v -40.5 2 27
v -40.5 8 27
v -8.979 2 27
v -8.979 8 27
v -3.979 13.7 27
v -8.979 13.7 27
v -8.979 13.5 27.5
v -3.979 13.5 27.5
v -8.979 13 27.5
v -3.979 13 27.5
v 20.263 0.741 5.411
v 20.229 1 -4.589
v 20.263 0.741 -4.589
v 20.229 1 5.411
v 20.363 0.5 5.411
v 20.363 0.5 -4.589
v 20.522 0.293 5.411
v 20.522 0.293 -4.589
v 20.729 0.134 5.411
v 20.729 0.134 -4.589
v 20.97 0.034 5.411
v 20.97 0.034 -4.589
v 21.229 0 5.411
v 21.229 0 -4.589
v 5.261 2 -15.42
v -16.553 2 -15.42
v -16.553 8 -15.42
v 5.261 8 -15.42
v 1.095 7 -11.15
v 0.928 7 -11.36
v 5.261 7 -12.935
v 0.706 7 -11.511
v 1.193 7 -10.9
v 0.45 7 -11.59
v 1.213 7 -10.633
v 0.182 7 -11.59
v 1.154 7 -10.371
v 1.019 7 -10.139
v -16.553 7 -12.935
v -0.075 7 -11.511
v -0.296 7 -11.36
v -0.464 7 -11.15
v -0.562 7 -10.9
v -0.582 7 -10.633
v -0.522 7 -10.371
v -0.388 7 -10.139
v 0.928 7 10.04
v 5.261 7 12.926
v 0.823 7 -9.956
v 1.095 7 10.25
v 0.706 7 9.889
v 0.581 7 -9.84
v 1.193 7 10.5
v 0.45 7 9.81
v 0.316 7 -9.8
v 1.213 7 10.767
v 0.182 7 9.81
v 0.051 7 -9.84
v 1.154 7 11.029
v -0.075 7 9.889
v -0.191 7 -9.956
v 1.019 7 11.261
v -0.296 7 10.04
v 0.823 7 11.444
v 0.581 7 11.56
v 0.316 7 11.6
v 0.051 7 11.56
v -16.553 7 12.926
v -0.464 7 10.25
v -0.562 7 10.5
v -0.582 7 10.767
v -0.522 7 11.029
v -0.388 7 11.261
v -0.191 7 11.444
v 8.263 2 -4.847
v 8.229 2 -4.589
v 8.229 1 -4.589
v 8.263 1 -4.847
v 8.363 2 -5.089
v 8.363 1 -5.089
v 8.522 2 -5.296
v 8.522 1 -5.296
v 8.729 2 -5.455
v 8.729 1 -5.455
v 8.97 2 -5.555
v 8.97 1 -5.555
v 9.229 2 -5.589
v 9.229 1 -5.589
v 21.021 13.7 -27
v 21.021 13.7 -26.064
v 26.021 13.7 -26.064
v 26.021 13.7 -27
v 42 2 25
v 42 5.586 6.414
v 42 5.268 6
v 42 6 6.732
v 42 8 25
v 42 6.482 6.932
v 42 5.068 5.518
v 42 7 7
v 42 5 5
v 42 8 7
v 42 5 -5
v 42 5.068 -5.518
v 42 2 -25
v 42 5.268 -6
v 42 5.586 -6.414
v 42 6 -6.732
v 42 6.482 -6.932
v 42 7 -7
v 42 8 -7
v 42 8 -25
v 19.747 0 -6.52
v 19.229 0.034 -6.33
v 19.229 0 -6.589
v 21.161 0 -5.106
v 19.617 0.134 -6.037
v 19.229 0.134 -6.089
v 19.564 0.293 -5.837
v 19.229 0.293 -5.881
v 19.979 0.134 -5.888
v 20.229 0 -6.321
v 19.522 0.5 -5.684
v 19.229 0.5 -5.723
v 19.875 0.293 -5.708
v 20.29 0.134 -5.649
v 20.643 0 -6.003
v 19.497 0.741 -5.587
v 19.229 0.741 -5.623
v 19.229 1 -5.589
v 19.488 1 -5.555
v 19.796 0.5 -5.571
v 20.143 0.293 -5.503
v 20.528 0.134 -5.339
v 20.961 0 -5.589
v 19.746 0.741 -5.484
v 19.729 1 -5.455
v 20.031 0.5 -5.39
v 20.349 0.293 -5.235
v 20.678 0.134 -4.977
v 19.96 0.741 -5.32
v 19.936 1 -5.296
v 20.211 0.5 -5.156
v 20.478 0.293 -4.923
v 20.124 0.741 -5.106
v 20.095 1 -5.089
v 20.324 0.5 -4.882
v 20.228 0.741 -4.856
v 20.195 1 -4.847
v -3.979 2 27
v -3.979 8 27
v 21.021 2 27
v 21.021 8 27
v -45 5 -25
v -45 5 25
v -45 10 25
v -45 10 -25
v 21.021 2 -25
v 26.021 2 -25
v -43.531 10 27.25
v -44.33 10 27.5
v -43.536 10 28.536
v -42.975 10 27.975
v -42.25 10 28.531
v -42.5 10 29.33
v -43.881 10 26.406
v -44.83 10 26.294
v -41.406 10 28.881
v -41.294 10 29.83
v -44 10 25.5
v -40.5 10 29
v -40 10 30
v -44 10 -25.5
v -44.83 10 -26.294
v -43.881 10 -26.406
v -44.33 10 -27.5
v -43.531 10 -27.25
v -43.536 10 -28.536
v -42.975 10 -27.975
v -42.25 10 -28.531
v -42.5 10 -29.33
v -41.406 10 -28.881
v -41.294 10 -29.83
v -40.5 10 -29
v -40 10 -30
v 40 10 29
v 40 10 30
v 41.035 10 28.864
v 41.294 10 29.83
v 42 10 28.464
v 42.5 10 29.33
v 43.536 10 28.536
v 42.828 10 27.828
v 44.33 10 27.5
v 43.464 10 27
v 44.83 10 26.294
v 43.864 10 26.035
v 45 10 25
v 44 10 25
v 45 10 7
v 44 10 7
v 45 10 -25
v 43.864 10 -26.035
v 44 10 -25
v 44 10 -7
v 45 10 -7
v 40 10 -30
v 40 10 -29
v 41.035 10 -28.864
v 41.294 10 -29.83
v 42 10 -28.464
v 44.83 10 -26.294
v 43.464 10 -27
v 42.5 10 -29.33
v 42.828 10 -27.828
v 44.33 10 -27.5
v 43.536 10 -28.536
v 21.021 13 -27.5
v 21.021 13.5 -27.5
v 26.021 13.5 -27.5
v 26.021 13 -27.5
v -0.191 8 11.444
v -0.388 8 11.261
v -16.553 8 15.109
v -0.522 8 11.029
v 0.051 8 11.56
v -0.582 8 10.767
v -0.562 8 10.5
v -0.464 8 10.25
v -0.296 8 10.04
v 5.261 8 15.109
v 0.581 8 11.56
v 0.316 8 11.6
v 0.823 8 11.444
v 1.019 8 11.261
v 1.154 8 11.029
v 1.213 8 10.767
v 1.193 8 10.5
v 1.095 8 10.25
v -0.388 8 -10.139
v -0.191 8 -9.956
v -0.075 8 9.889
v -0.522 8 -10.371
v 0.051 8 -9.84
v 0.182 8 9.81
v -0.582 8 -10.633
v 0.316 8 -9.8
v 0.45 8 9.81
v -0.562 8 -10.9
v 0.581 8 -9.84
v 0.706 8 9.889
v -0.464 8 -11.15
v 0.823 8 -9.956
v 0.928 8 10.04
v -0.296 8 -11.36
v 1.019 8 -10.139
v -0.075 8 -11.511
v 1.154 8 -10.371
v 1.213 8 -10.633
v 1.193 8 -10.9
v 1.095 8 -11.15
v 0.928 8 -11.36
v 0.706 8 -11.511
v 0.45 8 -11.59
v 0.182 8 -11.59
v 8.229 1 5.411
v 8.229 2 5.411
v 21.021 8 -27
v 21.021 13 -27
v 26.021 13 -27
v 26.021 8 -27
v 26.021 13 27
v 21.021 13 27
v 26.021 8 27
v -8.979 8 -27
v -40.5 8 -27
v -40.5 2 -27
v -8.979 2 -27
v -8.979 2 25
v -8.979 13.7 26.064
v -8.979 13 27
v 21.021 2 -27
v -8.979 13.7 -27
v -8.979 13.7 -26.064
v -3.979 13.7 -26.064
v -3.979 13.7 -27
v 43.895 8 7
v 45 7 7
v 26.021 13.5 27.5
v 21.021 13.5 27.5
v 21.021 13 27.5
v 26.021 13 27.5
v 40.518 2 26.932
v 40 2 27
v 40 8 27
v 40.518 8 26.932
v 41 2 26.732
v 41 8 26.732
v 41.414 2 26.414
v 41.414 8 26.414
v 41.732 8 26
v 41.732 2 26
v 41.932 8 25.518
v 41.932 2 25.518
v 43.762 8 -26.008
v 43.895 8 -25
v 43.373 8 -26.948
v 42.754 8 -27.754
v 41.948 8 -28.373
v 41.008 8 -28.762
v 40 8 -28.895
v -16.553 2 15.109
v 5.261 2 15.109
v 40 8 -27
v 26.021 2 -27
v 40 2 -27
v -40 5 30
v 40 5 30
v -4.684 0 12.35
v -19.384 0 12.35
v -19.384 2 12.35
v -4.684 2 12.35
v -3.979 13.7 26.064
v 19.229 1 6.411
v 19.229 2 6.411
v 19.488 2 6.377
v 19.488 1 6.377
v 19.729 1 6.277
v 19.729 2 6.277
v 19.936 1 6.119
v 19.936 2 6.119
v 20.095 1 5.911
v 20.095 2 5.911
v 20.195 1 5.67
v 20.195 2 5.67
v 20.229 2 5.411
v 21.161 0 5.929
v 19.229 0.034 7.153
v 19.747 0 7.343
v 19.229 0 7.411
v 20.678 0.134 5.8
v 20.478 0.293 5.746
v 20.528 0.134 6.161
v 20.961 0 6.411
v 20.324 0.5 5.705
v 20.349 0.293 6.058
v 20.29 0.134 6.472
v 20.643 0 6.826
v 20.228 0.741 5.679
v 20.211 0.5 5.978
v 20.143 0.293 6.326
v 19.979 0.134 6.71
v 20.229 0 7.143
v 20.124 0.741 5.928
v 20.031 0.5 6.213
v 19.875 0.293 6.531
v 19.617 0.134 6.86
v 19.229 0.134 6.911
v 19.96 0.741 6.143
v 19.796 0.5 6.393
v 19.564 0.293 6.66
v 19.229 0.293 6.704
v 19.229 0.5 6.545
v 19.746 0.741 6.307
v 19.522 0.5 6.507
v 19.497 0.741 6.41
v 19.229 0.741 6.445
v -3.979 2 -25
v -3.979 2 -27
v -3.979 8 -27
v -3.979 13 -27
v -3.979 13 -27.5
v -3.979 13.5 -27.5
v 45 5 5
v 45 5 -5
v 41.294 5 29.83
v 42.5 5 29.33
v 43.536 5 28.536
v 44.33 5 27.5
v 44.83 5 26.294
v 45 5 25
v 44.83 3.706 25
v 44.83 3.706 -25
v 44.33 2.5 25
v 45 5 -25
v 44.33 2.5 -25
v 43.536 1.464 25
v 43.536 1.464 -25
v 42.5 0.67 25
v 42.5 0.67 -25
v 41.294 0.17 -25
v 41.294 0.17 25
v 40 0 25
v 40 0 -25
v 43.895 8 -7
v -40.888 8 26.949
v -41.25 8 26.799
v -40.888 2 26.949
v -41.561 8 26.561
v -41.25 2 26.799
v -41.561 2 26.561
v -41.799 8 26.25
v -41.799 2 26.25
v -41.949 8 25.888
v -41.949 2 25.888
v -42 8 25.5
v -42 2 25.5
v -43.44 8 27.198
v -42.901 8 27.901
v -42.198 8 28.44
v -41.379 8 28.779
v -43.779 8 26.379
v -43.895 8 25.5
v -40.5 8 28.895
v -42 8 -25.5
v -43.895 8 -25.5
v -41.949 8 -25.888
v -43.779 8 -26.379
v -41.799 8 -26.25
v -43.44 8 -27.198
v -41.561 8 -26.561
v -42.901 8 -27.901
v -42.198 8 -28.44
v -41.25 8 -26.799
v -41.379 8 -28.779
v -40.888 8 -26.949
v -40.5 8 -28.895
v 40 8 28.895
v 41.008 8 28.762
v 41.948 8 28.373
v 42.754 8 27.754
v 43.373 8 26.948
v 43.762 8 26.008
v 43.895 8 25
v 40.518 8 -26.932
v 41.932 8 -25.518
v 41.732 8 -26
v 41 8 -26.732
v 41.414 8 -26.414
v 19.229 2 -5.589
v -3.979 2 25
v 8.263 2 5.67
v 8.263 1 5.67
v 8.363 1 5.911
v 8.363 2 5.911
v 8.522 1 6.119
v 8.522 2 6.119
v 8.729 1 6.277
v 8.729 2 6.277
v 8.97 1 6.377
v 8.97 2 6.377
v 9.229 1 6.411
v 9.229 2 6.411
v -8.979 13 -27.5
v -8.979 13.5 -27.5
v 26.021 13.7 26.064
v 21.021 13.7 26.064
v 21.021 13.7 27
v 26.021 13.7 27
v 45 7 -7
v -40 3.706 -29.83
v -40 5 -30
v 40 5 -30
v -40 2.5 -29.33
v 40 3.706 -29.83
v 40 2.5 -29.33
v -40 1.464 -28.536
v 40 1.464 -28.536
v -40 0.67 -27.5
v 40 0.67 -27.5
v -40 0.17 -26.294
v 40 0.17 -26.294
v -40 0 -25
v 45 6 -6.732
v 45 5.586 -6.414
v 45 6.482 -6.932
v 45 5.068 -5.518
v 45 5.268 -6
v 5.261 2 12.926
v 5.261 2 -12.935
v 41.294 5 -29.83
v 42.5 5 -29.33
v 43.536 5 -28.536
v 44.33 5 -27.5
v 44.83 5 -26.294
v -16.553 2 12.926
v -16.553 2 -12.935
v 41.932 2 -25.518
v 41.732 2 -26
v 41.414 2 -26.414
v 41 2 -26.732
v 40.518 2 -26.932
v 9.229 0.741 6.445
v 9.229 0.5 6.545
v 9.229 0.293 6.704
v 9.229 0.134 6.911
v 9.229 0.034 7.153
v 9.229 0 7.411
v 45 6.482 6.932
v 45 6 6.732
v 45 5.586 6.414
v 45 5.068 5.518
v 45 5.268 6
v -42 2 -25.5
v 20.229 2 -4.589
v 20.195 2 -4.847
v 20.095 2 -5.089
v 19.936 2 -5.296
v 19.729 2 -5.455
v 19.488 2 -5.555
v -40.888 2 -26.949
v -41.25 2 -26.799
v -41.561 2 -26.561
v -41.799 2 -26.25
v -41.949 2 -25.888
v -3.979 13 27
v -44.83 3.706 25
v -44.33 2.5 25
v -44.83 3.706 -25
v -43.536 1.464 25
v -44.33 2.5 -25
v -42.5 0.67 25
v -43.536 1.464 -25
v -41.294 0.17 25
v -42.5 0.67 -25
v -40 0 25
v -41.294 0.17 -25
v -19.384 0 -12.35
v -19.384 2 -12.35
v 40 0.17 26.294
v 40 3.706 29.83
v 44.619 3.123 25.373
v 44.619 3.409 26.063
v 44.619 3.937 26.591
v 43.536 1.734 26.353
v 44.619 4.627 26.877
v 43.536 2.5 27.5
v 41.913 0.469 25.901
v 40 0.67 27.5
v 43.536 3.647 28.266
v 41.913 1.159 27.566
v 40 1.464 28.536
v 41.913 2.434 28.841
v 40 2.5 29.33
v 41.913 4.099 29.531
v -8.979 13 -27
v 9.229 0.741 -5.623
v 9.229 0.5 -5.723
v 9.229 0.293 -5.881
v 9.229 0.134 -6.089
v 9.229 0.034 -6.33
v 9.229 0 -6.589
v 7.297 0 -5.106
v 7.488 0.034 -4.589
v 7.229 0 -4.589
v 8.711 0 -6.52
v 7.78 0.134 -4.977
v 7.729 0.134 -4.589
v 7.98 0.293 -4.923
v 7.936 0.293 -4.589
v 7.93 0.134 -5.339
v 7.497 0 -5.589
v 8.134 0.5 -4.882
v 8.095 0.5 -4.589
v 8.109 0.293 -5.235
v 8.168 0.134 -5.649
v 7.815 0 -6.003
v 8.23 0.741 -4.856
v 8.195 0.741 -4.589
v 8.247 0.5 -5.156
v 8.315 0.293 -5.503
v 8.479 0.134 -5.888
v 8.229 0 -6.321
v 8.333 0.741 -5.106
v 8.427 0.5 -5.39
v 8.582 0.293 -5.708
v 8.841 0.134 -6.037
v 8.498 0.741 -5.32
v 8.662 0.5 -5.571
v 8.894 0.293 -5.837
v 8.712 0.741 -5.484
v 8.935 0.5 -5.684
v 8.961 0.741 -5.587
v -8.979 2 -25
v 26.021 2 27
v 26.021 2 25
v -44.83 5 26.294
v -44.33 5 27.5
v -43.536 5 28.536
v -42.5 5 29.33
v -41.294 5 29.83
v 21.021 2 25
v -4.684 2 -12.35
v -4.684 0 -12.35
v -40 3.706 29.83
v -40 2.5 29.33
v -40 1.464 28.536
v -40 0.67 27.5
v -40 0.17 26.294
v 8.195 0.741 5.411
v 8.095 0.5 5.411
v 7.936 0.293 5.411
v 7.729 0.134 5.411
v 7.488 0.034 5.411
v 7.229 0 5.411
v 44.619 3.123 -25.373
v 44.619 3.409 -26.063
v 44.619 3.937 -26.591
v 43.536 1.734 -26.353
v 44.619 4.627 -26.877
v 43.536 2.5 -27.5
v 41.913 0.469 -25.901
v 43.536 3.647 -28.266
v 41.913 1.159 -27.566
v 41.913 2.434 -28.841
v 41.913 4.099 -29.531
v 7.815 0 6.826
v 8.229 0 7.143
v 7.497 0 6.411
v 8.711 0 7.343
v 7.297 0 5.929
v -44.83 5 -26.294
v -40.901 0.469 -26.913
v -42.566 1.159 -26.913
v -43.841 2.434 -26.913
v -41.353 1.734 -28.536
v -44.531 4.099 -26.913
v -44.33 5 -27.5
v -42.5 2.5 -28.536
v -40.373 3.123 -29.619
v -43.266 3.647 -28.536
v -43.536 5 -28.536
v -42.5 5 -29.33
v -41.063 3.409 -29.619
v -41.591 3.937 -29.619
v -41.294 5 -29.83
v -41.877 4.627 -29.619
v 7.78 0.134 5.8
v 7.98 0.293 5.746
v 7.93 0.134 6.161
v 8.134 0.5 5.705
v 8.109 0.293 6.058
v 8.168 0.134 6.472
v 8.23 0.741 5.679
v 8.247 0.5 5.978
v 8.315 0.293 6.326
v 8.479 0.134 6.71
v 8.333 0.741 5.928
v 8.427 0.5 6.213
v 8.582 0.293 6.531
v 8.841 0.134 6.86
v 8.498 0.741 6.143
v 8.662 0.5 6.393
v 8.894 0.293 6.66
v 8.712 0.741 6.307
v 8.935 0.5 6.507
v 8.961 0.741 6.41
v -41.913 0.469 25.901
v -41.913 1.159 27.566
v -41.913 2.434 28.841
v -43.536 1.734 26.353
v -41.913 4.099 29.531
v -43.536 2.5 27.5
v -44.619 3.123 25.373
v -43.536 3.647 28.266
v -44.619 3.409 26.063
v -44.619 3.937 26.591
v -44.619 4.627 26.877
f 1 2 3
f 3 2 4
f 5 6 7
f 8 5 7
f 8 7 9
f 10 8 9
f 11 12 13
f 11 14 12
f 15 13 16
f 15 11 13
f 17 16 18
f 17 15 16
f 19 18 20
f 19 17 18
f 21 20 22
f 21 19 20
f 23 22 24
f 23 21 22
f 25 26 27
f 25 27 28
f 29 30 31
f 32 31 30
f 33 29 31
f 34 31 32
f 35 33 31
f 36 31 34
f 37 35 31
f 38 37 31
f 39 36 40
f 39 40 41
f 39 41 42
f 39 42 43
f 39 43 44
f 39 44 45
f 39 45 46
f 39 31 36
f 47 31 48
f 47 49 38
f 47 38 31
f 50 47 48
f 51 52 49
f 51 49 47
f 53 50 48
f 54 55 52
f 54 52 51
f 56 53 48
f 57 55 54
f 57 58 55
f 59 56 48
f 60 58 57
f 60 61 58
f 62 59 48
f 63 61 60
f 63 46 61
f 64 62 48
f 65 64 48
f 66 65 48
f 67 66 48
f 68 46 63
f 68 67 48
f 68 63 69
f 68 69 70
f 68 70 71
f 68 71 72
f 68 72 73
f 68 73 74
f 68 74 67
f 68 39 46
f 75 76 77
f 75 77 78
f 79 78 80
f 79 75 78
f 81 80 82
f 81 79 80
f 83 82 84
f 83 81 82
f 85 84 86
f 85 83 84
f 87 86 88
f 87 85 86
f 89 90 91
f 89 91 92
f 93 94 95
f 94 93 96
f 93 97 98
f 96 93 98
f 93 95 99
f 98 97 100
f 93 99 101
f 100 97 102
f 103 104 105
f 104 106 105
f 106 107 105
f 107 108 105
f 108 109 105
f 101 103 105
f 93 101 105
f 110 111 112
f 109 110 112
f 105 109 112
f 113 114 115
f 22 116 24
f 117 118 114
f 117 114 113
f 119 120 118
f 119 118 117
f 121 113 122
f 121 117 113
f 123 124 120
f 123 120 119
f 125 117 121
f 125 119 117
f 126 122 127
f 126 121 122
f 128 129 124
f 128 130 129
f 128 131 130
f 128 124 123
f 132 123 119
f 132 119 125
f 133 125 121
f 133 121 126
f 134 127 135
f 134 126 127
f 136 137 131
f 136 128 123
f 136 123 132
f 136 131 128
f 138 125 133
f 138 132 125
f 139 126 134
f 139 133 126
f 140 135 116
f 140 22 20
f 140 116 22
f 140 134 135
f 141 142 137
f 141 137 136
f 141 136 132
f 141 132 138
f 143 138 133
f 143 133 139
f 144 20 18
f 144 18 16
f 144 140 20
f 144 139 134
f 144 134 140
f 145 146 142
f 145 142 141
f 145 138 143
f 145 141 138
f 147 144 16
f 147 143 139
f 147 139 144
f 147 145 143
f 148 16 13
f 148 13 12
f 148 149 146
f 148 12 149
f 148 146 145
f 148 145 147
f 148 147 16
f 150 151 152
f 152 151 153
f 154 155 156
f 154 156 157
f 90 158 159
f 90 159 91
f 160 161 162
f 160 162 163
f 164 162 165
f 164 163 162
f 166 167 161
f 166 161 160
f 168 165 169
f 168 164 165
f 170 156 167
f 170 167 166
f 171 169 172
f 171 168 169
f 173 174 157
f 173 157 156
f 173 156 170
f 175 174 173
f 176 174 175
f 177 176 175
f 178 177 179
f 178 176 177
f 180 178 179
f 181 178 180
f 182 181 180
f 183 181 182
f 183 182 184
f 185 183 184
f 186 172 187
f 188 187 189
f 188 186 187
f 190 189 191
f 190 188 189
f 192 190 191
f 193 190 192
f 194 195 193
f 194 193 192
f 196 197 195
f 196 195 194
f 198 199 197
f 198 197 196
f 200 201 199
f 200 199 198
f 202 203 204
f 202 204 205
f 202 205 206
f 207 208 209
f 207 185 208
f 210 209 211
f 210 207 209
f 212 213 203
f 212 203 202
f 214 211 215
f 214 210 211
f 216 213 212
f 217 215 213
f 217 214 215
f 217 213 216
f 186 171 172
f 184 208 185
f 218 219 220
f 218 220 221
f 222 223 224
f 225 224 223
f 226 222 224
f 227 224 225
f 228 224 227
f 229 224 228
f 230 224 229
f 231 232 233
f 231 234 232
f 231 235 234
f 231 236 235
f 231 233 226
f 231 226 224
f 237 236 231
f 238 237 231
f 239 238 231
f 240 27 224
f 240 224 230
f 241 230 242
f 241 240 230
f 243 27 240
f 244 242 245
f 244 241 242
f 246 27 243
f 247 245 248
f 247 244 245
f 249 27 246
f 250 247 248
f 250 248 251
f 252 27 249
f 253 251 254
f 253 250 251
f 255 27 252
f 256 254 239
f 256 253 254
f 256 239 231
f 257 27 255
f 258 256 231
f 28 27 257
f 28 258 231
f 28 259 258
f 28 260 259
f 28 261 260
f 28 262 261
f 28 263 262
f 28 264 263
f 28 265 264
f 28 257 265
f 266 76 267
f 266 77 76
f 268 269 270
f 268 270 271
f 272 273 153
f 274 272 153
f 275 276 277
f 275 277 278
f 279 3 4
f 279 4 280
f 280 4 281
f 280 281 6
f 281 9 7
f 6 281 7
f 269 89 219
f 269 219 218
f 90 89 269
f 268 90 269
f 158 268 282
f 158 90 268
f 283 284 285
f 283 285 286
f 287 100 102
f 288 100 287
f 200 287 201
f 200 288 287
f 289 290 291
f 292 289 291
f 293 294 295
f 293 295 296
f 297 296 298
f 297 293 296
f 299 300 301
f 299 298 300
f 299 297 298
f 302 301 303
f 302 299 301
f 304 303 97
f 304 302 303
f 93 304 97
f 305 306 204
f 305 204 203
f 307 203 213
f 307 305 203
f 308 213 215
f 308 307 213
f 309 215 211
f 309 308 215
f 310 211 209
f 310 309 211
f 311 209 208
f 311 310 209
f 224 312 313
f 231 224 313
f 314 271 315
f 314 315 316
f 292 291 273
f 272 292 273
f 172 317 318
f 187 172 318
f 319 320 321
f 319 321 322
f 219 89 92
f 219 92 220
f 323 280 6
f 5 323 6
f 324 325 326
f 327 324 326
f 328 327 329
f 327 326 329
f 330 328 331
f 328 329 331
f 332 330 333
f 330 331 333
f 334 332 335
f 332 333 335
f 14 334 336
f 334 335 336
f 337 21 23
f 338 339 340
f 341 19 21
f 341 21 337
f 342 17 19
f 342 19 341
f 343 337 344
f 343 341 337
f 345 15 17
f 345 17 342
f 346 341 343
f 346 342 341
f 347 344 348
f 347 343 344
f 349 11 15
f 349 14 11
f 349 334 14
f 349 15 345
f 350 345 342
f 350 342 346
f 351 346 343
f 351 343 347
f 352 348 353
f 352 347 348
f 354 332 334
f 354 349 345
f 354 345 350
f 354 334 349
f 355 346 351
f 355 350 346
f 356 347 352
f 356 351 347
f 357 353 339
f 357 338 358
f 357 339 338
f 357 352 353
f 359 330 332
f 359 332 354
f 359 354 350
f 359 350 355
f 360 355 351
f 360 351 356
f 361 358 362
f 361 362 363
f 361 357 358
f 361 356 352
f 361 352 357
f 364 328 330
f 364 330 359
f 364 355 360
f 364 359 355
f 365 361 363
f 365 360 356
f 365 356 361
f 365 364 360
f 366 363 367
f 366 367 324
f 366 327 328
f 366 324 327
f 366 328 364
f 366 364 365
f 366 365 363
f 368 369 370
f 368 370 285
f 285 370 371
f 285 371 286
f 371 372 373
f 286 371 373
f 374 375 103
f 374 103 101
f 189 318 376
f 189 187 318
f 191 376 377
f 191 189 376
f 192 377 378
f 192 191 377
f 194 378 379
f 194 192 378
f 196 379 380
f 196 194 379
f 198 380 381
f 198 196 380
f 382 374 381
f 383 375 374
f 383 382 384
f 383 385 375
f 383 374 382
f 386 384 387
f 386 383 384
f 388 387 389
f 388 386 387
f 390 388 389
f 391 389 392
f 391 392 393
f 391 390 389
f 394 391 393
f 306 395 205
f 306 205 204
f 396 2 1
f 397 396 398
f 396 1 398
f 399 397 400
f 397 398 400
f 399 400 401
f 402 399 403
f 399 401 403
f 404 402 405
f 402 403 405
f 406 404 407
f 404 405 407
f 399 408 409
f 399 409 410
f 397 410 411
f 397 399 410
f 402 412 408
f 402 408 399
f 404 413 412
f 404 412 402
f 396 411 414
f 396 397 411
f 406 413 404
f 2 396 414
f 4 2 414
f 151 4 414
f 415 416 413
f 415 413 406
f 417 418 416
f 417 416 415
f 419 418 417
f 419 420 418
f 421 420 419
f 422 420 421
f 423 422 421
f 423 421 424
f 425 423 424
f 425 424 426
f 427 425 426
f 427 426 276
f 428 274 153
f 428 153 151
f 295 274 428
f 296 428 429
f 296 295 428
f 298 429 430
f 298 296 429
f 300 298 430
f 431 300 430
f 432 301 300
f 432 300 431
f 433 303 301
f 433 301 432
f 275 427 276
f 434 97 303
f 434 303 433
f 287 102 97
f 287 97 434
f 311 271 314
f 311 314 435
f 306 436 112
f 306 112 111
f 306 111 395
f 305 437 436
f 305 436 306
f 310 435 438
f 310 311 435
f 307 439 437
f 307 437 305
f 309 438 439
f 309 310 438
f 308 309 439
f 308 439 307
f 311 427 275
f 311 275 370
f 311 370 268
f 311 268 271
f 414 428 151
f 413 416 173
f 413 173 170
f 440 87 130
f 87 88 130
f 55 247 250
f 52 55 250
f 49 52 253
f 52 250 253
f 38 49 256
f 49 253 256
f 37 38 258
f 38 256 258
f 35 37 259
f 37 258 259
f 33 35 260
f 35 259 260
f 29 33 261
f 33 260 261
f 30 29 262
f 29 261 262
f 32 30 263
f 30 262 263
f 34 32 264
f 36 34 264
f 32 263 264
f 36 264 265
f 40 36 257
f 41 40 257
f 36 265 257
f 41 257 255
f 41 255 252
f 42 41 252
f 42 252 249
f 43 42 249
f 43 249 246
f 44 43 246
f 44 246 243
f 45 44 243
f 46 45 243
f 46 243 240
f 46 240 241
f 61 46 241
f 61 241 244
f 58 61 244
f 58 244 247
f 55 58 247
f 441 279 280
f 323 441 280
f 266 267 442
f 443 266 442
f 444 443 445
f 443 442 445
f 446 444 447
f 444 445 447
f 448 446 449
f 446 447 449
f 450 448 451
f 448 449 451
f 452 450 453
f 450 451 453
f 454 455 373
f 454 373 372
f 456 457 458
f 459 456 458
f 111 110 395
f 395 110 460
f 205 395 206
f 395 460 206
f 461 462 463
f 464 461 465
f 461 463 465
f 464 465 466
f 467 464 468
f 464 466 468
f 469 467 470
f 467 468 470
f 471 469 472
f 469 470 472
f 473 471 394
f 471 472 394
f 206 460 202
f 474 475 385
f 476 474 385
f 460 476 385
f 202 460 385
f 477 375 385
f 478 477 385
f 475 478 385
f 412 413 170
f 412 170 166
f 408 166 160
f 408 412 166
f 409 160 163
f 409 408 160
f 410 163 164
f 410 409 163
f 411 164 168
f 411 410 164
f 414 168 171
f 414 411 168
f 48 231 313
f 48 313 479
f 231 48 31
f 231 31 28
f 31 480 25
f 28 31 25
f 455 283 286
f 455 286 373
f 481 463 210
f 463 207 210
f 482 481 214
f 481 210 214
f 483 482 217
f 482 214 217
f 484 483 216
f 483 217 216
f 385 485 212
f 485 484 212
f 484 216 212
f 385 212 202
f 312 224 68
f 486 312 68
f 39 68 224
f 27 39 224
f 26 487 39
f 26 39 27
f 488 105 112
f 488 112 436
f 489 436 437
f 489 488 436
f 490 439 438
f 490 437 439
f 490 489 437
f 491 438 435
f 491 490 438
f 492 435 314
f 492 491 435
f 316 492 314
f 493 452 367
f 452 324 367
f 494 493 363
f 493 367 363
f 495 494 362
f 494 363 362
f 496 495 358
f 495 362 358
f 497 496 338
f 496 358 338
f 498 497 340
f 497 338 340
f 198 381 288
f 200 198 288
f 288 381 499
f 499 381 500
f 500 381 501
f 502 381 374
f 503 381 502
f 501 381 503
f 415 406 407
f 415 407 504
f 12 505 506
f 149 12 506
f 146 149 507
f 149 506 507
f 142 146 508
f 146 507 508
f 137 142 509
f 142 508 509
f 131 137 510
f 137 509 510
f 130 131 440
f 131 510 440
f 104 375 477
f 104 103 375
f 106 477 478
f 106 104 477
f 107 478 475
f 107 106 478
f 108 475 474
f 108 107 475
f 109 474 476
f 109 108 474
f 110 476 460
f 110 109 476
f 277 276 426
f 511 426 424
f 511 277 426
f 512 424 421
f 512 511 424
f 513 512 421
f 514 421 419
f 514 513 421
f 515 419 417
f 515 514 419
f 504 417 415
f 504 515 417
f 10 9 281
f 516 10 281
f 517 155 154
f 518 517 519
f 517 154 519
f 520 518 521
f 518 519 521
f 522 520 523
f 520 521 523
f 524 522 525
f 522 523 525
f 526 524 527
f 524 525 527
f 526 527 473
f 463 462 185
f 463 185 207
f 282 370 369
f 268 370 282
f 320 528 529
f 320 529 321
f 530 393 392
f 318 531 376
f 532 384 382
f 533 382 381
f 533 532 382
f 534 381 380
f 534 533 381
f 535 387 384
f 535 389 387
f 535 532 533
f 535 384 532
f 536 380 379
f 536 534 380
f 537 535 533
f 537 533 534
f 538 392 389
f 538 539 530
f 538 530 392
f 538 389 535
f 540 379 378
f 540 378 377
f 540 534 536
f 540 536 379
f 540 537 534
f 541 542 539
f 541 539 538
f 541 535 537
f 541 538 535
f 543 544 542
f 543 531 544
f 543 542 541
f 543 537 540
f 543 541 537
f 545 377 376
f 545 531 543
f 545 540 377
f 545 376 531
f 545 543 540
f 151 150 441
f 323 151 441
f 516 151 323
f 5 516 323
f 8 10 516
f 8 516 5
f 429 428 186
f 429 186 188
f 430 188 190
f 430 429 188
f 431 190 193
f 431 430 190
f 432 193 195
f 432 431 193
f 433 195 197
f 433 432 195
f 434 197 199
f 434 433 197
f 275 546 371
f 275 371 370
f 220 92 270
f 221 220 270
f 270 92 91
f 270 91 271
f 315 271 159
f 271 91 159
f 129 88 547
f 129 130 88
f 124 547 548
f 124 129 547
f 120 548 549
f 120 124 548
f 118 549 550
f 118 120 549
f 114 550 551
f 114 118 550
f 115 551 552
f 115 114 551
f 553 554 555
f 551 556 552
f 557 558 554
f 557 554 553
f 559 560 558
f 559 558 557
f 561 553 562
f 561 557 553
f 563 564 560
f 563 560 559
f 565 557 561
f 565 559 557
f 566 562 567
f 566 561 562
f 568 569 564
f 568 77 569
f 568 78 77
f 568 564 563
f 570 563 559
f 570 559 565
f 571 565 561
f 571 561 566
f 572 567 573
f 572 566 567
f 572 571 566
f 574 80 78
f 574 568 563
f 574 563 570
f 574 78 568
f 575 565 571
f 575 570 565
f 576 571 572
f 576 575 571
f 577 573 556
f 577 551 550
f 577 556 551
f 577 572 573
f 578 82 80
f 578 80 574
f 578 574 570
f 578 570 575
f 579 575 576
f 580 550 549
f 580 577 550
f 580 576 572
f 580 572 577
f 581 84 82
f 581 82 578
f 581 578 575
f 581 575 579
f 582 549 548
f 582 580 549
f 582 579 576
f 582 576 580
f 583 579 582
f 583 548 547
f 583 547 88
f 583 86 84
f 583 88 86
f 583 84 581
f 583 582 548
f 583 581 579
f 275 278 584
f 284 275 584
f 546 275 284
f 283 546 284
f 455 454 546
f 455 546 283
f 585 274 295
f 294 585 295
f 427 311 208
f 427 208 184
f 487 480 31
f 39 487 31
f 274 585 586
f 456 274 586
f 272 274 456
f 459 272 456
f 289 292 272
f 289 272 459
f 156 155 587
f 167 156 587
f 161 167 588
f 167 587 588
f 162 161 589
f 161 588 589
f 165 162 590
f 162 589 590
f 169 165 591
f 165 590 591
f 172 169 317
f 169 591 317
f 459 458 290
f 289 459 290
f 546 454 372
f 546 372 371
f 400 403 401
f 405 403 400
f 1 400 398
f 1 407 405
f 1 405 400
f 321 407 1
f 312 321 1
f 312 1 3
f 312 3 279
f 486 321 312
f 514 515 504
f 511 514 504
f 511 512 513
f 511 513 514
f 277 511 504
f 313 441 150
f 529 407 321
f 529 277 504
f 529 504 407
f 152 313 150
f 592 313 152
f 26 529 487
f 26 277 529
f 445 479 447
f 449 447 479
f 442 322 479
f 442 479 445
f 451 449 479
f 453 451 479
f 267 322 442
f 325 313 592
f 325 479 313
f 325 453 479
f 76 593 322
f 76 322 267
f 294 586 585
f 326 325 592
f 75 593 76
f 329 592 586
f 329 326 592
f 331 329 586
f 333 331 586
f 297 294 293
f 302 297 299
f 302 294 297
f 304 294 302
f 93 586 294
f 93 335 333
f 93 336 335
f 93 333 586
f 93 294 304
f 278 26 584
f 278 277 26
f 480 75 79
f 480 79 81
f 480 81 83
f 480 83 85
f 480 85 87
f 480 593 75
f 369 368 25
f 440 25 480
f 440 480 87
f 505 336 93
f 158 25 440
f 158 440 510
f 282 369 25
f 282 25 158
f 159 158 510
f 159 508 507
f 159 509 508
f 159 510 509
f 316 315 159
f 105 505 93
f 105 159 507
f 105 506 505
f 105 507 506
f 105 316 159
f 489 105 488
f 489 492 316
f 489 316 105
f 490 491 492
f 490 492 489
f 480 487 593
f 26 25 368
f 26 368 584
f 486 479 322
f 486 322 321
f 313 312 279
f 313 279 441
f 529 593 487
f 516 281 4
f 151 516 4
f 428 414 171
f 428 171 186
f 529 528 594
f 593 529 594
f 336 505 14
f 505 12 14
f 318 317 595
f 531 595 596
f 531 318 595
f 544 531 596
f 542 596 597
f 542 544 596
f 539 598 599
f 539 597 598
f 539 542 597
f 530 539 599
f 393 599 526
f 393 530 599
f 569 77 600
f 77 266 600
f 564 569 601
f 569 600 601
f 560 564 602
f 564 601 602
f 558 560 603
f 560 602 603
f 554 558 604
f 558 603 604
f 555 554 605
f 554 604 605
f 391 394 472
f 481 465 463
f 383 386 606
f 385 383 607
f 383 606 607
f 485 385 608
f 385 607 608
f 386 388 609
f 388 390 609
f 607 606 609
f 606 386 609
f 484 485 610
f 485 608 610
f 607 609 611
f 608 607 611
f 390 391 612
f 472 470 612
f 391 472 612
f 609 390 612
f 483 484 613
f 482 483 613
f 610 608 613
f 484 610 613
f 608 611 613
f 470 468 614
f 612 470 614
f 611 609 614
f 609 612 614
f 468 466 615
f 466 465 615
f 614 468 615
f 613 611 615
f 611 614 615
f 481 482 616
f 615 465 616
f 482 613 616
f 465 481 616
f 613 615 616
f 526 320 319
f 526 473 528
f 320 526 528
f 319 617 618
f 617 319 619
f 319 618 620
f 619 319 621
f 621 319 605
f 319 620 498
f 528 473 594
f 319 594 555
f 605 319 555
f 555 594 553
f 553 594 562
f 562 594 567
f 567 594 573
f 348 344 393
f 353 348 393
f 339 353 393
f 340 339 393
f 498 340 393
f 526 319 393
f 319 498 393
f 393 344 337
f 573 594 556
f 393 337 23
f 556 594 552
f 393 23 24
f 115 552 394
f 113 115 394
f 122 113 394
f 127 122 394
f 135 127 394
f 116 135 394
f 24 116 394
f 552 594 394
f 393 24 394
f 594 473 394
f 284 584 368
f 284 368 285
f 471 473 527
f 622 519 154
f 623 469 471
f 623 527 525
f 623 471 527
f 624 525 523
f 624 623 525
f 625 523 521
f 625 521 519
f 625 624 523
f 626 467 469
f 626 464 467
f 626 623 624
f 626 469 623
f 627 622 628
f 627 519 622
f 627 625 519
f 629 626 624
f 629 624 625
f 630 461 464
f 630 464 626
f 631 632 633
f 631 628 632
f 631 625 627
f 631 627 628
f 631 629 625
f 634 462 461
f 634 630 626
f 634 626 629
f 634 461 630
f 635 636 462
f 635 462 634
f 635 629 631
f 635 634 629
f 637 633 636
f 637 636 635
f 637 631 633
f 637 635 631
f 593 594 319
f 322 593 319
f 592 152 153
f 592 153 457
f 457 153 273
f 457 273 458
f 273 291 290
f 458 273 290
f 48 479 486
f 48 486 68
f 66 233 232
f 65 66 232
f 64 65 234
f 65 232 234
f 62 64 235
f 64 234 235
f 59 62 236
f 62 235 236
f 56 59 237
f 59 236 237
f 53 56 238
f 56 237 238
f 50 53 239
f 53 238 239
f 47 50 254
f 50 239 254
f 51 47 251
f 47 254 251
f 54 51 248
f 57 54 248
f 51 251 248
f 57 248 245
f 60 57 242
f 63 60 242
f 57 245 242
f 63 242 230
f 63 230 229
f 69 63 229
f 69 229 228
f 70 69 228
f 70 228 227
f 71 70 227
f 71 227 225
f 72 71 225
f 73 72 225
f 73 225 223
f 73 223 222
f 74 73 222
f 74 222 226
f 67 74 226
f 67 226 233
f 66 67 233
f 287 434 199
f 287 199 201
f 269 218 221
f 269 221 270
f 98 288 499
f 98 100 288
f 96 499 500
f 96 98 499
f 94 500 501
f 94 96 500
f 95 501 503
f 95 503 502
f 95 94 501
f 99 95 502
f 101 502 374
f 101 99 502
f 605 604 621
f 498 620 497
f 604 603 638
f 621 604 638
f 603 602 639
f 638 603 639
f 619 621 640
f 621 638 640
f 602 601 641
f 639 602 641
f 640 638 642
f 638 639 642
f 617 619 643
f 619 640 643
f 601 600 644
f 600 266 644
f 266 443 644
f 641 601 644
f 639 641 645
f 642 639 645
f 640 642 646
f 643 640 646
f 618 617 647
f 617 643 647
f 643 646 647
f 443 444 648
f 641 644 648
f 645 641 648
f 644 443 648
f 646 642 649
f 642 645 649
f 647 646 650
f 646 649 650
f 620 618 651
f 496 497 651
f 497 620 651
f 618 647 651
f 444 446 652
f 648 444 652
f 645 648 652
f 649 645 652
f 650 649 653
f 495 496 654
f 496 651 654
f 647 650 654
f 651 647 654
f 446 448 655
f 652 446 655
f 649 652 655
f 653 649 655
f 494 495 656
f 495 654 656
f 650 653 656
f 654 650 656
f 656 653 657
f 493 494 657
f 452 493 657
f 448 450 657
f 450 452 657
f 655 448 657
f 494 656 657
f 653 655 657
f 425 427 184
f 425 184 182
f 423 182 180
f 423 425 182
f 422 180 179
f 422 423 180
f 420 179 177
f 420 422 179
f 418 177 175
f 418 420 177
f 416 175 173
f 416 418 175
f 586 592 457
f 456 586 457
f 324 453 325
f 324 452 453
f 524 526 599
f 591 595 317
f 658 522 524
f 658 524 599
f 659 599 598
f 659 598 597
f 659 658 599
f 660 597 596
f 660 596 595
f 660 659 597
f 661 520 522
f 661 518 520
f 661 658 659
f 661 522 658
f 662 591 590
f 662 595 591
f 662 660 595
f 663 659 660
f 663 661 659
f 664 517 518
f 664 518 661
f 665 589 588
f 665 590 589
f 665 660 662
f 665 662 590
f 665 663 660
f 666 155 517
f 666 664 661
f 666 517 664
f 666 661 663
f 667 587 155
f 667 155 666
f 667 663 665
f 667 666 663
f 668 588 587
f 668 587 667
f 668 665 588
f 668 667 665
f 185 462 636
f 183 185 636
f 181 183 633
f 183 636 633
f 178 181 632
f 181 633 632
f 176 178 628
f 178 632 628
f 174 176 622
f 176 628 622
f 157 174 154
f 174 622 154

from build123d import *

# Parameters (mm, degrees)
SKETCH1_W                = 90
SKETCH1_H                = 60
BOSS_EXTRUDE1_DEPTH      = 10
SKETCH2_W                = 84
SKETCH2_H                = 54
CUT_EXTRUDE1_DEPTH       = 8
FILLET1_R                = 1.5
FILLET2_R                = 2
FILLET3_R                = 5
FILLET4_R                = 5
SKETCH3_W                = 14.7
SKETCH3_H                = 24.7
CUT_EXTRUDE2_DEPTH       = 2
SKETCH4_W                = 21.81374525
SKETCH4_H                = 30.528820574
BOSS_EXTRUDE2_DEPTH      = 6
SKETCH5_W                = 25.860829819
SKETCH5_H                = 5
CUT_EXTRUDE3_DEPTH       = 21.813745251
SKETCH7_R                = 0.9
CUT_EXTRUDE5_DEPTH       = 3
SKETCH8_R                = 0.9
CUT_EXTRUDE6_DEPTH       = 3
SKETCH13_W               = 14
SKETCH13_H               = 10
CUT_EXTRUDE8_DEPTH       = 4
SKETCH14_W               = 12
SKETCH14_H               = 12
CUT_EXTRUDE9_DEPTH       = 2
FILLET8_R                = 1
LIP_GROOVE1_GROOVE_DEPTH = 2
LIP_GROOVE1_GROOVE_DRAFT = -3
FILLET9_R                = 2
SNAP_START               = -8.979179279
SNAP_HOOK9_DEPTH         = 5
LPATTERN1_COUNT          = 2
LPATTERN1_PITCH          = 30
MIRROR1_START            = -8.979179279
MIRROR1_COPY_1_DEPTH     = 5


# Read off the part's stored shape, not the designer's step: Lip&Groove1-Groove, Snap Hook9
with BuildPart() as part:
    # Sketch1 → Boss-Extrude1 (new body)
    with BuildSketch(Plane(origin=(0, 0, 0), x_dir=(1, 0, 0), z_dir=(0, 1, 0))):
        Rectangle(SKETCH1_W, SKETCH1_H)
    extrude(amount=BOSS_EXTRUDE1_DEPTH)

    # Sketch2 → Cut-Extrude1 (cut)
    with BuildSketch(Plane(origin=(0, 10, 0), x_dir=(1, 0, 0), z_dir=(0, 1, 0))):
        Rectangle(SKETCH2_W, SKETCH2_H)
    extrude(amount=-CUT_EXTRUDE1_DEPTH, mode=Mode.SUBTRACT)

    # Fillet1
    fillet1_edges = [part.edges().sort_by_distance(p)[0] for p in [
        (-42, 6, 27),
        (-42, 6, -27),
    ]]
    fillet(fillet1_edges, radius=FILLET1_R)

    # Fillet2
    fillet2_edges = [part.edges().sort_by_distance(p)[0] for p in [
        (42, 6, -27),
        (42, 6, 27),
    ]]
    fillet(fillet2_edges, radius=FILLET2_R)

    # Fillet3
    fillet3_edges = [part.edges().sort_by_distance(p)[0] for p in [
        (0, 0, 30),
        (-45, 0, 0),
        (0, 0, -30),
        (45, 0, 0),
        (45, 5, 30),
        (45, 5, -30),
    ]]
    fillet(fillet3_edges, radius=FILLET3_R)

    # Fillet4
    # the kernel refuses this fillet: 5 mm, written as the material it takes off along each edge
    with BuildSketch(Plane(origin=(-40, 5, -25), x_dir=(-1, 0, 0), z_dir=(0, 0, -1))) as fillet4_piece_1_section:
        Polygon((0, 0), (FILLET4_R, 0), (FILLET4_R, -FILLET4_R), (0, -FILLET4_R), align=None)
    fillet4_piece_1 = extrude(amount=FILLET4_R, mode=Mode.PRIVATE)
    fillet4_piece_1 = fillet4_piece_1 - Plane(origin=(-40, 5, -25), x_dir=(0.7071067811865475, 0.7071067811865475, 0), z_dir=(0, 0, -1)) * Sphere(FILLET4_R, mode=Mode.PRIVATE)
    add(fillet4_piece_1, mode=Mode.SUBTRACT)
    with BuildSketch(Plane(origin=(-40, 5, 25), x_dir=(0, 0, 1), z_dir=(-1, 0, 0))) as fillet4_piece_2_section:
        Polygon((0, 0), (FILLET4_R, 0), (FILLET4_R, -FILLET4_R), (0, -FILLET4_R), align=None)
    fillet4_piece_2 = extrude(amount=FILLET4_R, mode=Mode.PRIVATE)
    fillet4_piece_2 = fillet4_piece_2 - Plane(origin=(-40, 5, 25), x_dir=(0, 0.7071067811865475, -0.7071067811865475), z_dir=(-1, 0, 0)) * Sphere(FILLET4_R, mode=Mode.PRIVATE)
    add(fillet4_piece_2, mode=Mode.SUBTRACT)
    with BuildSketch(Plane(origin=(-45, 5, 30), x_dir=(0, 0, -1), z_dir=(0, 1, 0)), Plane(origin=(-45, 5, -30), x_dir=(1, 0, 0), z_dir=(0, 1, 0))) as fillet4_piece_3:
        with BuildLine():
            CenterArc((FILLET4_R, -FILLET4_R), FILLET4_R, 90, 90)
            Line((0, -FILLET4_R), (0, 0))
            Line((0, 0), (FILLET4_R, 0))
        make_face()
    extrude(amount=17.5, mode=Mode.SUBTRACT)

    # Sketch3 → Cut-Extrude2 (cut)
    with BuildSketch(Plane.XZ):
        with Locations((-12.034158324, 0)):
            Rectangle(SKETCH3_W, SKETCH3_H)
    extrude(amount=-CUT_EXTRUDE2_DEPTH, mode=Mode.SUBTRACT)

    # Sketch4 → Boss-Extrude2 (add)
    with BuildSketch(Plane(origin=(0, 2, 0), x_dir=(1, 0, 0), z_dir=(0, 1, 0))):
        with Locations((-5.646185712, 0.155219816)):
            Rectangle(SKETCH4_W, SKETCH4_H)
    extrude(amount=BOSS_EXTRUDE2_DEPTH)

    # Sketch5 → Cut-Extrude3 (cut)
    with BuildSketch(Plane.ZY.offset(16.553058337)):
        with Locations((-0.004897078, 4.5)):
            Rectangle(SKETCH5_W, SKETCH5_H)
    extrude(amount=-CUT_EXTRUDE3_DEPTH, mode=Mode.SUBTRACT)

    # Sketch7 → Cut-Extrude5 (cut)
    with BuildSketch(Plane(origin=(0, 8, 0), x_dir=(1, 0, 0), z_dir=(0, 1, 0))):
        with Locations(Location((0.315841676, -10.7, 0), (0, 0, 270))):
            Circle(SKETCH7_R)
    extrude(amount=-CUT_EXTRUDE5_DEPTH, mode=Mode.SUBTRACT)

    # Sketch8 → Cut-Extrude6 (cut)
    with BuildSketch(Plane(origin=(0, 8, 0), x_dir=(1, 0, 0), z_dir=(0, 1, 0))):
        with Locations(Location((0.315841676, 10.7, 0), (0, 0, 270))):
            Circle(SKETCH8_R)
    extrude(amount=-CUT_EXTRUDE6_DEPTH, mode=Mode.SUBTRACT)

    # Sketch13 → Cut-Extrude8 (cut)
    with BuildSketch(Plane.ZY.offset(-45)):
        with Locations((0, 10)):
            Rectangle(SKETCH13_W, SKETCH13_H)
    extrude(amount=CUT_EXTRUDE8_DEPTH, mode=Mode.SUBTRACT)

    # Sketch14 → Cut-Extrude9 (cut)
    with BuildSketch(Plane.XZ):
        with Locations((14.228896708, 0.411404455)):
            Rectangle(SKETCH14_W, SKETCH14_H)
    extrude(amount=-CUT_EXTRUDE9_DEPTH, mode=Mode.SUBTRACT)

    # Fillet8
    fillet8_edges = [part.edges().sort_by_distance(p)[0] for p in [
        (8.228896708, 0, 0.411404455),
        (14.228896708, 0, -5.588595545),
        (20.228896708, 0, 0.411404455),
        (14.228896708, 0, 6.411404455),
        (20.228896708, 1, -5.588595545),
        (20.228896708, 1, 6.411404455),
        (8.228896708, 1, 6.411404455),
        (8.228896708, 1, -5.588595545),
    ]]
    fillet(fillet8_edges, radius=FILLET8_R)


with BuildPart() as lip_groove1_groove_tool:
    # Lip&Groove1-Groove outline → Lip&Groove1-Groove (with draft: the straight prism first)
    with BuildSketch(Plane(origin=(0, 8, 0), x_dir=(1, 0, 0), z_dir=(0, 1, 0))):
        with BuildLine():
            Line((43.895184441, 7), (43.895184441, 25))
            ThreePointArc((43.895184441, 25), (42.754311333, 27.754311333), (40, 28.895184441))
            Line((40, 28.895184441), (-40.5, 28.895184441))
            ThreePointArc((-40.5, 28.895184441), (-42.900757942, 27.900757942), (-43.895184441, 25.5))
            Line((-43.895184441, 25.5), (-43.895184441, -25.5))
            ThreePointArc((-43.895184441, -25.5), (-42.900757942, -27.900757942), (-40.5, -28.895184441))
            Line((-40.5, -28.895184441), (40, -28.895184441))
            ThreePointArc((40, -28.895184441), (42.754311333, -27.754311333), (43.895184441, -25))
            Line((43.895184441, -25), (43.895184441, -7))
            Line((43.895184441, -7), (42, -7))
            Line((42, -7), (42, -25))
            ThreePointArc((42, -25), (41.414213562, -26.414213562), (40, -27))
            Line((40, -27), (-40.5, -27))
            ThreePointArc((-40.5, -27), (-41.560660172, -26.560660172), (-42, -25.5))
            Line((-42, -25.5), (-42, 25.5))
            ThreePointArc((-42, 25.5), (-41.560660172, 26.560660172), (-40.5, 27))
            Line((-40.5, 27), (40, 27))
            ThreePointArc((40, 27), (41.414213562, 26.414213562), (42, 25))
            Line((42, 25), (42, 7))
            Line((42, 7), (43.895184441, 7))
        make_face()
    extrude(amount=LIP_GROOVE1_GROOVE_DEPTH)
    # Lip&Groove1-Groove: the draft: its side faces are tilted about the plane it starts from
    lip_groove1_groove_sides = [lip_groove1_groove_tool.faces().sort_by_distance(p)[0] for p in [
        (43.895184441, 9, -16),
        (42.754311333, 9, -27.754311333),
        (-0.25, 9, -28.895184441),
        (-42.900757942, 9, -27.900757942),
        (-43.895184441, 9, 0),
        (-42.900757942, 9, 27.900757942),
        (-0.25, 9, 28.895184441),
        (42.754311333, 9, 27.754311333),
        (43.895184441, 9, 16),
        (42.94759222, 9, 7),
        (42, 9, 16),
        (41.414213562, 9, 26.414213562),
        (-0.25, 9, 27),
        (-41.560660172, 9, 26.560660172),
        (-42, 9, 0),
        (-41.560660172, 9, -26.560660172),
        (-0.25, 9, -27),
        (41.414213562, 9, -26.414213562),
        (42, 9, -16),
        (42.94759222, 9, -7),
    ]]
    draft(lip_groove1_groove_sides, Plane(origin=(0, 8, 0), x_dir=(1, 0, 0), z_dir=(0, 1, 0)), LIP_GROOVE1_GROOVE_DRAFT)


with BuildPart() as part_1:
    add(part.part)

    # Lip&Groove1-Groove: cut by lip_groove1_groove_tool
    add(lip_groove1_groove_tool.part, mode=Mode.SUBTRACT)

    # Fillet9
    fillet9_edges = [part_1.edges().sort_by_distance(p)[0] for p in [
        (43.5, 5, -7),
        (43.5, 5, 7),
    ]]
    fillet(fillet9_edges, radius=FILLET9_R)

    # Snap Hook9 outline → Snap Hook9 (add)
    with BuildSketch(Plane.YZ.offset(SNAP_START)):
        Polygon((13, 27.5), (13, 27), (2, 27), (2, 25), (13.7, 26.063636364), (13.7, 27), (13.5, 27.5), align=None)
    snap_hook9 = extrude(amount=SNAP_HOOK9_DEPTH)

    # LPattern1: Snap Hook9 ×2
    with Locations(*[(i * LPATTERN1_PITCH, 0, 0) for i in range(1, LPATTERN1_COUNT)]):
        add(snap_hook9)

    # Mirror1: Snap Hook9 across plane
    add(snap_hook9.mirror(Plane.XY))

    # Mirror1 copy 1 sketch → Mirror1 copy 1 (add)
    with BuildSketch(Plane.YZ.offset(30).offset(MIRROR1_START)):
        Polygon((13, -27.5), (13, -27), (2, -27), (2, -25), (13.7, -26.063636364), (13.7, -27), (13.5, -27.5), align=None)
    extrude(amount=MIRROR1_COPY_1_DEPTH)


solid = part_1.part
